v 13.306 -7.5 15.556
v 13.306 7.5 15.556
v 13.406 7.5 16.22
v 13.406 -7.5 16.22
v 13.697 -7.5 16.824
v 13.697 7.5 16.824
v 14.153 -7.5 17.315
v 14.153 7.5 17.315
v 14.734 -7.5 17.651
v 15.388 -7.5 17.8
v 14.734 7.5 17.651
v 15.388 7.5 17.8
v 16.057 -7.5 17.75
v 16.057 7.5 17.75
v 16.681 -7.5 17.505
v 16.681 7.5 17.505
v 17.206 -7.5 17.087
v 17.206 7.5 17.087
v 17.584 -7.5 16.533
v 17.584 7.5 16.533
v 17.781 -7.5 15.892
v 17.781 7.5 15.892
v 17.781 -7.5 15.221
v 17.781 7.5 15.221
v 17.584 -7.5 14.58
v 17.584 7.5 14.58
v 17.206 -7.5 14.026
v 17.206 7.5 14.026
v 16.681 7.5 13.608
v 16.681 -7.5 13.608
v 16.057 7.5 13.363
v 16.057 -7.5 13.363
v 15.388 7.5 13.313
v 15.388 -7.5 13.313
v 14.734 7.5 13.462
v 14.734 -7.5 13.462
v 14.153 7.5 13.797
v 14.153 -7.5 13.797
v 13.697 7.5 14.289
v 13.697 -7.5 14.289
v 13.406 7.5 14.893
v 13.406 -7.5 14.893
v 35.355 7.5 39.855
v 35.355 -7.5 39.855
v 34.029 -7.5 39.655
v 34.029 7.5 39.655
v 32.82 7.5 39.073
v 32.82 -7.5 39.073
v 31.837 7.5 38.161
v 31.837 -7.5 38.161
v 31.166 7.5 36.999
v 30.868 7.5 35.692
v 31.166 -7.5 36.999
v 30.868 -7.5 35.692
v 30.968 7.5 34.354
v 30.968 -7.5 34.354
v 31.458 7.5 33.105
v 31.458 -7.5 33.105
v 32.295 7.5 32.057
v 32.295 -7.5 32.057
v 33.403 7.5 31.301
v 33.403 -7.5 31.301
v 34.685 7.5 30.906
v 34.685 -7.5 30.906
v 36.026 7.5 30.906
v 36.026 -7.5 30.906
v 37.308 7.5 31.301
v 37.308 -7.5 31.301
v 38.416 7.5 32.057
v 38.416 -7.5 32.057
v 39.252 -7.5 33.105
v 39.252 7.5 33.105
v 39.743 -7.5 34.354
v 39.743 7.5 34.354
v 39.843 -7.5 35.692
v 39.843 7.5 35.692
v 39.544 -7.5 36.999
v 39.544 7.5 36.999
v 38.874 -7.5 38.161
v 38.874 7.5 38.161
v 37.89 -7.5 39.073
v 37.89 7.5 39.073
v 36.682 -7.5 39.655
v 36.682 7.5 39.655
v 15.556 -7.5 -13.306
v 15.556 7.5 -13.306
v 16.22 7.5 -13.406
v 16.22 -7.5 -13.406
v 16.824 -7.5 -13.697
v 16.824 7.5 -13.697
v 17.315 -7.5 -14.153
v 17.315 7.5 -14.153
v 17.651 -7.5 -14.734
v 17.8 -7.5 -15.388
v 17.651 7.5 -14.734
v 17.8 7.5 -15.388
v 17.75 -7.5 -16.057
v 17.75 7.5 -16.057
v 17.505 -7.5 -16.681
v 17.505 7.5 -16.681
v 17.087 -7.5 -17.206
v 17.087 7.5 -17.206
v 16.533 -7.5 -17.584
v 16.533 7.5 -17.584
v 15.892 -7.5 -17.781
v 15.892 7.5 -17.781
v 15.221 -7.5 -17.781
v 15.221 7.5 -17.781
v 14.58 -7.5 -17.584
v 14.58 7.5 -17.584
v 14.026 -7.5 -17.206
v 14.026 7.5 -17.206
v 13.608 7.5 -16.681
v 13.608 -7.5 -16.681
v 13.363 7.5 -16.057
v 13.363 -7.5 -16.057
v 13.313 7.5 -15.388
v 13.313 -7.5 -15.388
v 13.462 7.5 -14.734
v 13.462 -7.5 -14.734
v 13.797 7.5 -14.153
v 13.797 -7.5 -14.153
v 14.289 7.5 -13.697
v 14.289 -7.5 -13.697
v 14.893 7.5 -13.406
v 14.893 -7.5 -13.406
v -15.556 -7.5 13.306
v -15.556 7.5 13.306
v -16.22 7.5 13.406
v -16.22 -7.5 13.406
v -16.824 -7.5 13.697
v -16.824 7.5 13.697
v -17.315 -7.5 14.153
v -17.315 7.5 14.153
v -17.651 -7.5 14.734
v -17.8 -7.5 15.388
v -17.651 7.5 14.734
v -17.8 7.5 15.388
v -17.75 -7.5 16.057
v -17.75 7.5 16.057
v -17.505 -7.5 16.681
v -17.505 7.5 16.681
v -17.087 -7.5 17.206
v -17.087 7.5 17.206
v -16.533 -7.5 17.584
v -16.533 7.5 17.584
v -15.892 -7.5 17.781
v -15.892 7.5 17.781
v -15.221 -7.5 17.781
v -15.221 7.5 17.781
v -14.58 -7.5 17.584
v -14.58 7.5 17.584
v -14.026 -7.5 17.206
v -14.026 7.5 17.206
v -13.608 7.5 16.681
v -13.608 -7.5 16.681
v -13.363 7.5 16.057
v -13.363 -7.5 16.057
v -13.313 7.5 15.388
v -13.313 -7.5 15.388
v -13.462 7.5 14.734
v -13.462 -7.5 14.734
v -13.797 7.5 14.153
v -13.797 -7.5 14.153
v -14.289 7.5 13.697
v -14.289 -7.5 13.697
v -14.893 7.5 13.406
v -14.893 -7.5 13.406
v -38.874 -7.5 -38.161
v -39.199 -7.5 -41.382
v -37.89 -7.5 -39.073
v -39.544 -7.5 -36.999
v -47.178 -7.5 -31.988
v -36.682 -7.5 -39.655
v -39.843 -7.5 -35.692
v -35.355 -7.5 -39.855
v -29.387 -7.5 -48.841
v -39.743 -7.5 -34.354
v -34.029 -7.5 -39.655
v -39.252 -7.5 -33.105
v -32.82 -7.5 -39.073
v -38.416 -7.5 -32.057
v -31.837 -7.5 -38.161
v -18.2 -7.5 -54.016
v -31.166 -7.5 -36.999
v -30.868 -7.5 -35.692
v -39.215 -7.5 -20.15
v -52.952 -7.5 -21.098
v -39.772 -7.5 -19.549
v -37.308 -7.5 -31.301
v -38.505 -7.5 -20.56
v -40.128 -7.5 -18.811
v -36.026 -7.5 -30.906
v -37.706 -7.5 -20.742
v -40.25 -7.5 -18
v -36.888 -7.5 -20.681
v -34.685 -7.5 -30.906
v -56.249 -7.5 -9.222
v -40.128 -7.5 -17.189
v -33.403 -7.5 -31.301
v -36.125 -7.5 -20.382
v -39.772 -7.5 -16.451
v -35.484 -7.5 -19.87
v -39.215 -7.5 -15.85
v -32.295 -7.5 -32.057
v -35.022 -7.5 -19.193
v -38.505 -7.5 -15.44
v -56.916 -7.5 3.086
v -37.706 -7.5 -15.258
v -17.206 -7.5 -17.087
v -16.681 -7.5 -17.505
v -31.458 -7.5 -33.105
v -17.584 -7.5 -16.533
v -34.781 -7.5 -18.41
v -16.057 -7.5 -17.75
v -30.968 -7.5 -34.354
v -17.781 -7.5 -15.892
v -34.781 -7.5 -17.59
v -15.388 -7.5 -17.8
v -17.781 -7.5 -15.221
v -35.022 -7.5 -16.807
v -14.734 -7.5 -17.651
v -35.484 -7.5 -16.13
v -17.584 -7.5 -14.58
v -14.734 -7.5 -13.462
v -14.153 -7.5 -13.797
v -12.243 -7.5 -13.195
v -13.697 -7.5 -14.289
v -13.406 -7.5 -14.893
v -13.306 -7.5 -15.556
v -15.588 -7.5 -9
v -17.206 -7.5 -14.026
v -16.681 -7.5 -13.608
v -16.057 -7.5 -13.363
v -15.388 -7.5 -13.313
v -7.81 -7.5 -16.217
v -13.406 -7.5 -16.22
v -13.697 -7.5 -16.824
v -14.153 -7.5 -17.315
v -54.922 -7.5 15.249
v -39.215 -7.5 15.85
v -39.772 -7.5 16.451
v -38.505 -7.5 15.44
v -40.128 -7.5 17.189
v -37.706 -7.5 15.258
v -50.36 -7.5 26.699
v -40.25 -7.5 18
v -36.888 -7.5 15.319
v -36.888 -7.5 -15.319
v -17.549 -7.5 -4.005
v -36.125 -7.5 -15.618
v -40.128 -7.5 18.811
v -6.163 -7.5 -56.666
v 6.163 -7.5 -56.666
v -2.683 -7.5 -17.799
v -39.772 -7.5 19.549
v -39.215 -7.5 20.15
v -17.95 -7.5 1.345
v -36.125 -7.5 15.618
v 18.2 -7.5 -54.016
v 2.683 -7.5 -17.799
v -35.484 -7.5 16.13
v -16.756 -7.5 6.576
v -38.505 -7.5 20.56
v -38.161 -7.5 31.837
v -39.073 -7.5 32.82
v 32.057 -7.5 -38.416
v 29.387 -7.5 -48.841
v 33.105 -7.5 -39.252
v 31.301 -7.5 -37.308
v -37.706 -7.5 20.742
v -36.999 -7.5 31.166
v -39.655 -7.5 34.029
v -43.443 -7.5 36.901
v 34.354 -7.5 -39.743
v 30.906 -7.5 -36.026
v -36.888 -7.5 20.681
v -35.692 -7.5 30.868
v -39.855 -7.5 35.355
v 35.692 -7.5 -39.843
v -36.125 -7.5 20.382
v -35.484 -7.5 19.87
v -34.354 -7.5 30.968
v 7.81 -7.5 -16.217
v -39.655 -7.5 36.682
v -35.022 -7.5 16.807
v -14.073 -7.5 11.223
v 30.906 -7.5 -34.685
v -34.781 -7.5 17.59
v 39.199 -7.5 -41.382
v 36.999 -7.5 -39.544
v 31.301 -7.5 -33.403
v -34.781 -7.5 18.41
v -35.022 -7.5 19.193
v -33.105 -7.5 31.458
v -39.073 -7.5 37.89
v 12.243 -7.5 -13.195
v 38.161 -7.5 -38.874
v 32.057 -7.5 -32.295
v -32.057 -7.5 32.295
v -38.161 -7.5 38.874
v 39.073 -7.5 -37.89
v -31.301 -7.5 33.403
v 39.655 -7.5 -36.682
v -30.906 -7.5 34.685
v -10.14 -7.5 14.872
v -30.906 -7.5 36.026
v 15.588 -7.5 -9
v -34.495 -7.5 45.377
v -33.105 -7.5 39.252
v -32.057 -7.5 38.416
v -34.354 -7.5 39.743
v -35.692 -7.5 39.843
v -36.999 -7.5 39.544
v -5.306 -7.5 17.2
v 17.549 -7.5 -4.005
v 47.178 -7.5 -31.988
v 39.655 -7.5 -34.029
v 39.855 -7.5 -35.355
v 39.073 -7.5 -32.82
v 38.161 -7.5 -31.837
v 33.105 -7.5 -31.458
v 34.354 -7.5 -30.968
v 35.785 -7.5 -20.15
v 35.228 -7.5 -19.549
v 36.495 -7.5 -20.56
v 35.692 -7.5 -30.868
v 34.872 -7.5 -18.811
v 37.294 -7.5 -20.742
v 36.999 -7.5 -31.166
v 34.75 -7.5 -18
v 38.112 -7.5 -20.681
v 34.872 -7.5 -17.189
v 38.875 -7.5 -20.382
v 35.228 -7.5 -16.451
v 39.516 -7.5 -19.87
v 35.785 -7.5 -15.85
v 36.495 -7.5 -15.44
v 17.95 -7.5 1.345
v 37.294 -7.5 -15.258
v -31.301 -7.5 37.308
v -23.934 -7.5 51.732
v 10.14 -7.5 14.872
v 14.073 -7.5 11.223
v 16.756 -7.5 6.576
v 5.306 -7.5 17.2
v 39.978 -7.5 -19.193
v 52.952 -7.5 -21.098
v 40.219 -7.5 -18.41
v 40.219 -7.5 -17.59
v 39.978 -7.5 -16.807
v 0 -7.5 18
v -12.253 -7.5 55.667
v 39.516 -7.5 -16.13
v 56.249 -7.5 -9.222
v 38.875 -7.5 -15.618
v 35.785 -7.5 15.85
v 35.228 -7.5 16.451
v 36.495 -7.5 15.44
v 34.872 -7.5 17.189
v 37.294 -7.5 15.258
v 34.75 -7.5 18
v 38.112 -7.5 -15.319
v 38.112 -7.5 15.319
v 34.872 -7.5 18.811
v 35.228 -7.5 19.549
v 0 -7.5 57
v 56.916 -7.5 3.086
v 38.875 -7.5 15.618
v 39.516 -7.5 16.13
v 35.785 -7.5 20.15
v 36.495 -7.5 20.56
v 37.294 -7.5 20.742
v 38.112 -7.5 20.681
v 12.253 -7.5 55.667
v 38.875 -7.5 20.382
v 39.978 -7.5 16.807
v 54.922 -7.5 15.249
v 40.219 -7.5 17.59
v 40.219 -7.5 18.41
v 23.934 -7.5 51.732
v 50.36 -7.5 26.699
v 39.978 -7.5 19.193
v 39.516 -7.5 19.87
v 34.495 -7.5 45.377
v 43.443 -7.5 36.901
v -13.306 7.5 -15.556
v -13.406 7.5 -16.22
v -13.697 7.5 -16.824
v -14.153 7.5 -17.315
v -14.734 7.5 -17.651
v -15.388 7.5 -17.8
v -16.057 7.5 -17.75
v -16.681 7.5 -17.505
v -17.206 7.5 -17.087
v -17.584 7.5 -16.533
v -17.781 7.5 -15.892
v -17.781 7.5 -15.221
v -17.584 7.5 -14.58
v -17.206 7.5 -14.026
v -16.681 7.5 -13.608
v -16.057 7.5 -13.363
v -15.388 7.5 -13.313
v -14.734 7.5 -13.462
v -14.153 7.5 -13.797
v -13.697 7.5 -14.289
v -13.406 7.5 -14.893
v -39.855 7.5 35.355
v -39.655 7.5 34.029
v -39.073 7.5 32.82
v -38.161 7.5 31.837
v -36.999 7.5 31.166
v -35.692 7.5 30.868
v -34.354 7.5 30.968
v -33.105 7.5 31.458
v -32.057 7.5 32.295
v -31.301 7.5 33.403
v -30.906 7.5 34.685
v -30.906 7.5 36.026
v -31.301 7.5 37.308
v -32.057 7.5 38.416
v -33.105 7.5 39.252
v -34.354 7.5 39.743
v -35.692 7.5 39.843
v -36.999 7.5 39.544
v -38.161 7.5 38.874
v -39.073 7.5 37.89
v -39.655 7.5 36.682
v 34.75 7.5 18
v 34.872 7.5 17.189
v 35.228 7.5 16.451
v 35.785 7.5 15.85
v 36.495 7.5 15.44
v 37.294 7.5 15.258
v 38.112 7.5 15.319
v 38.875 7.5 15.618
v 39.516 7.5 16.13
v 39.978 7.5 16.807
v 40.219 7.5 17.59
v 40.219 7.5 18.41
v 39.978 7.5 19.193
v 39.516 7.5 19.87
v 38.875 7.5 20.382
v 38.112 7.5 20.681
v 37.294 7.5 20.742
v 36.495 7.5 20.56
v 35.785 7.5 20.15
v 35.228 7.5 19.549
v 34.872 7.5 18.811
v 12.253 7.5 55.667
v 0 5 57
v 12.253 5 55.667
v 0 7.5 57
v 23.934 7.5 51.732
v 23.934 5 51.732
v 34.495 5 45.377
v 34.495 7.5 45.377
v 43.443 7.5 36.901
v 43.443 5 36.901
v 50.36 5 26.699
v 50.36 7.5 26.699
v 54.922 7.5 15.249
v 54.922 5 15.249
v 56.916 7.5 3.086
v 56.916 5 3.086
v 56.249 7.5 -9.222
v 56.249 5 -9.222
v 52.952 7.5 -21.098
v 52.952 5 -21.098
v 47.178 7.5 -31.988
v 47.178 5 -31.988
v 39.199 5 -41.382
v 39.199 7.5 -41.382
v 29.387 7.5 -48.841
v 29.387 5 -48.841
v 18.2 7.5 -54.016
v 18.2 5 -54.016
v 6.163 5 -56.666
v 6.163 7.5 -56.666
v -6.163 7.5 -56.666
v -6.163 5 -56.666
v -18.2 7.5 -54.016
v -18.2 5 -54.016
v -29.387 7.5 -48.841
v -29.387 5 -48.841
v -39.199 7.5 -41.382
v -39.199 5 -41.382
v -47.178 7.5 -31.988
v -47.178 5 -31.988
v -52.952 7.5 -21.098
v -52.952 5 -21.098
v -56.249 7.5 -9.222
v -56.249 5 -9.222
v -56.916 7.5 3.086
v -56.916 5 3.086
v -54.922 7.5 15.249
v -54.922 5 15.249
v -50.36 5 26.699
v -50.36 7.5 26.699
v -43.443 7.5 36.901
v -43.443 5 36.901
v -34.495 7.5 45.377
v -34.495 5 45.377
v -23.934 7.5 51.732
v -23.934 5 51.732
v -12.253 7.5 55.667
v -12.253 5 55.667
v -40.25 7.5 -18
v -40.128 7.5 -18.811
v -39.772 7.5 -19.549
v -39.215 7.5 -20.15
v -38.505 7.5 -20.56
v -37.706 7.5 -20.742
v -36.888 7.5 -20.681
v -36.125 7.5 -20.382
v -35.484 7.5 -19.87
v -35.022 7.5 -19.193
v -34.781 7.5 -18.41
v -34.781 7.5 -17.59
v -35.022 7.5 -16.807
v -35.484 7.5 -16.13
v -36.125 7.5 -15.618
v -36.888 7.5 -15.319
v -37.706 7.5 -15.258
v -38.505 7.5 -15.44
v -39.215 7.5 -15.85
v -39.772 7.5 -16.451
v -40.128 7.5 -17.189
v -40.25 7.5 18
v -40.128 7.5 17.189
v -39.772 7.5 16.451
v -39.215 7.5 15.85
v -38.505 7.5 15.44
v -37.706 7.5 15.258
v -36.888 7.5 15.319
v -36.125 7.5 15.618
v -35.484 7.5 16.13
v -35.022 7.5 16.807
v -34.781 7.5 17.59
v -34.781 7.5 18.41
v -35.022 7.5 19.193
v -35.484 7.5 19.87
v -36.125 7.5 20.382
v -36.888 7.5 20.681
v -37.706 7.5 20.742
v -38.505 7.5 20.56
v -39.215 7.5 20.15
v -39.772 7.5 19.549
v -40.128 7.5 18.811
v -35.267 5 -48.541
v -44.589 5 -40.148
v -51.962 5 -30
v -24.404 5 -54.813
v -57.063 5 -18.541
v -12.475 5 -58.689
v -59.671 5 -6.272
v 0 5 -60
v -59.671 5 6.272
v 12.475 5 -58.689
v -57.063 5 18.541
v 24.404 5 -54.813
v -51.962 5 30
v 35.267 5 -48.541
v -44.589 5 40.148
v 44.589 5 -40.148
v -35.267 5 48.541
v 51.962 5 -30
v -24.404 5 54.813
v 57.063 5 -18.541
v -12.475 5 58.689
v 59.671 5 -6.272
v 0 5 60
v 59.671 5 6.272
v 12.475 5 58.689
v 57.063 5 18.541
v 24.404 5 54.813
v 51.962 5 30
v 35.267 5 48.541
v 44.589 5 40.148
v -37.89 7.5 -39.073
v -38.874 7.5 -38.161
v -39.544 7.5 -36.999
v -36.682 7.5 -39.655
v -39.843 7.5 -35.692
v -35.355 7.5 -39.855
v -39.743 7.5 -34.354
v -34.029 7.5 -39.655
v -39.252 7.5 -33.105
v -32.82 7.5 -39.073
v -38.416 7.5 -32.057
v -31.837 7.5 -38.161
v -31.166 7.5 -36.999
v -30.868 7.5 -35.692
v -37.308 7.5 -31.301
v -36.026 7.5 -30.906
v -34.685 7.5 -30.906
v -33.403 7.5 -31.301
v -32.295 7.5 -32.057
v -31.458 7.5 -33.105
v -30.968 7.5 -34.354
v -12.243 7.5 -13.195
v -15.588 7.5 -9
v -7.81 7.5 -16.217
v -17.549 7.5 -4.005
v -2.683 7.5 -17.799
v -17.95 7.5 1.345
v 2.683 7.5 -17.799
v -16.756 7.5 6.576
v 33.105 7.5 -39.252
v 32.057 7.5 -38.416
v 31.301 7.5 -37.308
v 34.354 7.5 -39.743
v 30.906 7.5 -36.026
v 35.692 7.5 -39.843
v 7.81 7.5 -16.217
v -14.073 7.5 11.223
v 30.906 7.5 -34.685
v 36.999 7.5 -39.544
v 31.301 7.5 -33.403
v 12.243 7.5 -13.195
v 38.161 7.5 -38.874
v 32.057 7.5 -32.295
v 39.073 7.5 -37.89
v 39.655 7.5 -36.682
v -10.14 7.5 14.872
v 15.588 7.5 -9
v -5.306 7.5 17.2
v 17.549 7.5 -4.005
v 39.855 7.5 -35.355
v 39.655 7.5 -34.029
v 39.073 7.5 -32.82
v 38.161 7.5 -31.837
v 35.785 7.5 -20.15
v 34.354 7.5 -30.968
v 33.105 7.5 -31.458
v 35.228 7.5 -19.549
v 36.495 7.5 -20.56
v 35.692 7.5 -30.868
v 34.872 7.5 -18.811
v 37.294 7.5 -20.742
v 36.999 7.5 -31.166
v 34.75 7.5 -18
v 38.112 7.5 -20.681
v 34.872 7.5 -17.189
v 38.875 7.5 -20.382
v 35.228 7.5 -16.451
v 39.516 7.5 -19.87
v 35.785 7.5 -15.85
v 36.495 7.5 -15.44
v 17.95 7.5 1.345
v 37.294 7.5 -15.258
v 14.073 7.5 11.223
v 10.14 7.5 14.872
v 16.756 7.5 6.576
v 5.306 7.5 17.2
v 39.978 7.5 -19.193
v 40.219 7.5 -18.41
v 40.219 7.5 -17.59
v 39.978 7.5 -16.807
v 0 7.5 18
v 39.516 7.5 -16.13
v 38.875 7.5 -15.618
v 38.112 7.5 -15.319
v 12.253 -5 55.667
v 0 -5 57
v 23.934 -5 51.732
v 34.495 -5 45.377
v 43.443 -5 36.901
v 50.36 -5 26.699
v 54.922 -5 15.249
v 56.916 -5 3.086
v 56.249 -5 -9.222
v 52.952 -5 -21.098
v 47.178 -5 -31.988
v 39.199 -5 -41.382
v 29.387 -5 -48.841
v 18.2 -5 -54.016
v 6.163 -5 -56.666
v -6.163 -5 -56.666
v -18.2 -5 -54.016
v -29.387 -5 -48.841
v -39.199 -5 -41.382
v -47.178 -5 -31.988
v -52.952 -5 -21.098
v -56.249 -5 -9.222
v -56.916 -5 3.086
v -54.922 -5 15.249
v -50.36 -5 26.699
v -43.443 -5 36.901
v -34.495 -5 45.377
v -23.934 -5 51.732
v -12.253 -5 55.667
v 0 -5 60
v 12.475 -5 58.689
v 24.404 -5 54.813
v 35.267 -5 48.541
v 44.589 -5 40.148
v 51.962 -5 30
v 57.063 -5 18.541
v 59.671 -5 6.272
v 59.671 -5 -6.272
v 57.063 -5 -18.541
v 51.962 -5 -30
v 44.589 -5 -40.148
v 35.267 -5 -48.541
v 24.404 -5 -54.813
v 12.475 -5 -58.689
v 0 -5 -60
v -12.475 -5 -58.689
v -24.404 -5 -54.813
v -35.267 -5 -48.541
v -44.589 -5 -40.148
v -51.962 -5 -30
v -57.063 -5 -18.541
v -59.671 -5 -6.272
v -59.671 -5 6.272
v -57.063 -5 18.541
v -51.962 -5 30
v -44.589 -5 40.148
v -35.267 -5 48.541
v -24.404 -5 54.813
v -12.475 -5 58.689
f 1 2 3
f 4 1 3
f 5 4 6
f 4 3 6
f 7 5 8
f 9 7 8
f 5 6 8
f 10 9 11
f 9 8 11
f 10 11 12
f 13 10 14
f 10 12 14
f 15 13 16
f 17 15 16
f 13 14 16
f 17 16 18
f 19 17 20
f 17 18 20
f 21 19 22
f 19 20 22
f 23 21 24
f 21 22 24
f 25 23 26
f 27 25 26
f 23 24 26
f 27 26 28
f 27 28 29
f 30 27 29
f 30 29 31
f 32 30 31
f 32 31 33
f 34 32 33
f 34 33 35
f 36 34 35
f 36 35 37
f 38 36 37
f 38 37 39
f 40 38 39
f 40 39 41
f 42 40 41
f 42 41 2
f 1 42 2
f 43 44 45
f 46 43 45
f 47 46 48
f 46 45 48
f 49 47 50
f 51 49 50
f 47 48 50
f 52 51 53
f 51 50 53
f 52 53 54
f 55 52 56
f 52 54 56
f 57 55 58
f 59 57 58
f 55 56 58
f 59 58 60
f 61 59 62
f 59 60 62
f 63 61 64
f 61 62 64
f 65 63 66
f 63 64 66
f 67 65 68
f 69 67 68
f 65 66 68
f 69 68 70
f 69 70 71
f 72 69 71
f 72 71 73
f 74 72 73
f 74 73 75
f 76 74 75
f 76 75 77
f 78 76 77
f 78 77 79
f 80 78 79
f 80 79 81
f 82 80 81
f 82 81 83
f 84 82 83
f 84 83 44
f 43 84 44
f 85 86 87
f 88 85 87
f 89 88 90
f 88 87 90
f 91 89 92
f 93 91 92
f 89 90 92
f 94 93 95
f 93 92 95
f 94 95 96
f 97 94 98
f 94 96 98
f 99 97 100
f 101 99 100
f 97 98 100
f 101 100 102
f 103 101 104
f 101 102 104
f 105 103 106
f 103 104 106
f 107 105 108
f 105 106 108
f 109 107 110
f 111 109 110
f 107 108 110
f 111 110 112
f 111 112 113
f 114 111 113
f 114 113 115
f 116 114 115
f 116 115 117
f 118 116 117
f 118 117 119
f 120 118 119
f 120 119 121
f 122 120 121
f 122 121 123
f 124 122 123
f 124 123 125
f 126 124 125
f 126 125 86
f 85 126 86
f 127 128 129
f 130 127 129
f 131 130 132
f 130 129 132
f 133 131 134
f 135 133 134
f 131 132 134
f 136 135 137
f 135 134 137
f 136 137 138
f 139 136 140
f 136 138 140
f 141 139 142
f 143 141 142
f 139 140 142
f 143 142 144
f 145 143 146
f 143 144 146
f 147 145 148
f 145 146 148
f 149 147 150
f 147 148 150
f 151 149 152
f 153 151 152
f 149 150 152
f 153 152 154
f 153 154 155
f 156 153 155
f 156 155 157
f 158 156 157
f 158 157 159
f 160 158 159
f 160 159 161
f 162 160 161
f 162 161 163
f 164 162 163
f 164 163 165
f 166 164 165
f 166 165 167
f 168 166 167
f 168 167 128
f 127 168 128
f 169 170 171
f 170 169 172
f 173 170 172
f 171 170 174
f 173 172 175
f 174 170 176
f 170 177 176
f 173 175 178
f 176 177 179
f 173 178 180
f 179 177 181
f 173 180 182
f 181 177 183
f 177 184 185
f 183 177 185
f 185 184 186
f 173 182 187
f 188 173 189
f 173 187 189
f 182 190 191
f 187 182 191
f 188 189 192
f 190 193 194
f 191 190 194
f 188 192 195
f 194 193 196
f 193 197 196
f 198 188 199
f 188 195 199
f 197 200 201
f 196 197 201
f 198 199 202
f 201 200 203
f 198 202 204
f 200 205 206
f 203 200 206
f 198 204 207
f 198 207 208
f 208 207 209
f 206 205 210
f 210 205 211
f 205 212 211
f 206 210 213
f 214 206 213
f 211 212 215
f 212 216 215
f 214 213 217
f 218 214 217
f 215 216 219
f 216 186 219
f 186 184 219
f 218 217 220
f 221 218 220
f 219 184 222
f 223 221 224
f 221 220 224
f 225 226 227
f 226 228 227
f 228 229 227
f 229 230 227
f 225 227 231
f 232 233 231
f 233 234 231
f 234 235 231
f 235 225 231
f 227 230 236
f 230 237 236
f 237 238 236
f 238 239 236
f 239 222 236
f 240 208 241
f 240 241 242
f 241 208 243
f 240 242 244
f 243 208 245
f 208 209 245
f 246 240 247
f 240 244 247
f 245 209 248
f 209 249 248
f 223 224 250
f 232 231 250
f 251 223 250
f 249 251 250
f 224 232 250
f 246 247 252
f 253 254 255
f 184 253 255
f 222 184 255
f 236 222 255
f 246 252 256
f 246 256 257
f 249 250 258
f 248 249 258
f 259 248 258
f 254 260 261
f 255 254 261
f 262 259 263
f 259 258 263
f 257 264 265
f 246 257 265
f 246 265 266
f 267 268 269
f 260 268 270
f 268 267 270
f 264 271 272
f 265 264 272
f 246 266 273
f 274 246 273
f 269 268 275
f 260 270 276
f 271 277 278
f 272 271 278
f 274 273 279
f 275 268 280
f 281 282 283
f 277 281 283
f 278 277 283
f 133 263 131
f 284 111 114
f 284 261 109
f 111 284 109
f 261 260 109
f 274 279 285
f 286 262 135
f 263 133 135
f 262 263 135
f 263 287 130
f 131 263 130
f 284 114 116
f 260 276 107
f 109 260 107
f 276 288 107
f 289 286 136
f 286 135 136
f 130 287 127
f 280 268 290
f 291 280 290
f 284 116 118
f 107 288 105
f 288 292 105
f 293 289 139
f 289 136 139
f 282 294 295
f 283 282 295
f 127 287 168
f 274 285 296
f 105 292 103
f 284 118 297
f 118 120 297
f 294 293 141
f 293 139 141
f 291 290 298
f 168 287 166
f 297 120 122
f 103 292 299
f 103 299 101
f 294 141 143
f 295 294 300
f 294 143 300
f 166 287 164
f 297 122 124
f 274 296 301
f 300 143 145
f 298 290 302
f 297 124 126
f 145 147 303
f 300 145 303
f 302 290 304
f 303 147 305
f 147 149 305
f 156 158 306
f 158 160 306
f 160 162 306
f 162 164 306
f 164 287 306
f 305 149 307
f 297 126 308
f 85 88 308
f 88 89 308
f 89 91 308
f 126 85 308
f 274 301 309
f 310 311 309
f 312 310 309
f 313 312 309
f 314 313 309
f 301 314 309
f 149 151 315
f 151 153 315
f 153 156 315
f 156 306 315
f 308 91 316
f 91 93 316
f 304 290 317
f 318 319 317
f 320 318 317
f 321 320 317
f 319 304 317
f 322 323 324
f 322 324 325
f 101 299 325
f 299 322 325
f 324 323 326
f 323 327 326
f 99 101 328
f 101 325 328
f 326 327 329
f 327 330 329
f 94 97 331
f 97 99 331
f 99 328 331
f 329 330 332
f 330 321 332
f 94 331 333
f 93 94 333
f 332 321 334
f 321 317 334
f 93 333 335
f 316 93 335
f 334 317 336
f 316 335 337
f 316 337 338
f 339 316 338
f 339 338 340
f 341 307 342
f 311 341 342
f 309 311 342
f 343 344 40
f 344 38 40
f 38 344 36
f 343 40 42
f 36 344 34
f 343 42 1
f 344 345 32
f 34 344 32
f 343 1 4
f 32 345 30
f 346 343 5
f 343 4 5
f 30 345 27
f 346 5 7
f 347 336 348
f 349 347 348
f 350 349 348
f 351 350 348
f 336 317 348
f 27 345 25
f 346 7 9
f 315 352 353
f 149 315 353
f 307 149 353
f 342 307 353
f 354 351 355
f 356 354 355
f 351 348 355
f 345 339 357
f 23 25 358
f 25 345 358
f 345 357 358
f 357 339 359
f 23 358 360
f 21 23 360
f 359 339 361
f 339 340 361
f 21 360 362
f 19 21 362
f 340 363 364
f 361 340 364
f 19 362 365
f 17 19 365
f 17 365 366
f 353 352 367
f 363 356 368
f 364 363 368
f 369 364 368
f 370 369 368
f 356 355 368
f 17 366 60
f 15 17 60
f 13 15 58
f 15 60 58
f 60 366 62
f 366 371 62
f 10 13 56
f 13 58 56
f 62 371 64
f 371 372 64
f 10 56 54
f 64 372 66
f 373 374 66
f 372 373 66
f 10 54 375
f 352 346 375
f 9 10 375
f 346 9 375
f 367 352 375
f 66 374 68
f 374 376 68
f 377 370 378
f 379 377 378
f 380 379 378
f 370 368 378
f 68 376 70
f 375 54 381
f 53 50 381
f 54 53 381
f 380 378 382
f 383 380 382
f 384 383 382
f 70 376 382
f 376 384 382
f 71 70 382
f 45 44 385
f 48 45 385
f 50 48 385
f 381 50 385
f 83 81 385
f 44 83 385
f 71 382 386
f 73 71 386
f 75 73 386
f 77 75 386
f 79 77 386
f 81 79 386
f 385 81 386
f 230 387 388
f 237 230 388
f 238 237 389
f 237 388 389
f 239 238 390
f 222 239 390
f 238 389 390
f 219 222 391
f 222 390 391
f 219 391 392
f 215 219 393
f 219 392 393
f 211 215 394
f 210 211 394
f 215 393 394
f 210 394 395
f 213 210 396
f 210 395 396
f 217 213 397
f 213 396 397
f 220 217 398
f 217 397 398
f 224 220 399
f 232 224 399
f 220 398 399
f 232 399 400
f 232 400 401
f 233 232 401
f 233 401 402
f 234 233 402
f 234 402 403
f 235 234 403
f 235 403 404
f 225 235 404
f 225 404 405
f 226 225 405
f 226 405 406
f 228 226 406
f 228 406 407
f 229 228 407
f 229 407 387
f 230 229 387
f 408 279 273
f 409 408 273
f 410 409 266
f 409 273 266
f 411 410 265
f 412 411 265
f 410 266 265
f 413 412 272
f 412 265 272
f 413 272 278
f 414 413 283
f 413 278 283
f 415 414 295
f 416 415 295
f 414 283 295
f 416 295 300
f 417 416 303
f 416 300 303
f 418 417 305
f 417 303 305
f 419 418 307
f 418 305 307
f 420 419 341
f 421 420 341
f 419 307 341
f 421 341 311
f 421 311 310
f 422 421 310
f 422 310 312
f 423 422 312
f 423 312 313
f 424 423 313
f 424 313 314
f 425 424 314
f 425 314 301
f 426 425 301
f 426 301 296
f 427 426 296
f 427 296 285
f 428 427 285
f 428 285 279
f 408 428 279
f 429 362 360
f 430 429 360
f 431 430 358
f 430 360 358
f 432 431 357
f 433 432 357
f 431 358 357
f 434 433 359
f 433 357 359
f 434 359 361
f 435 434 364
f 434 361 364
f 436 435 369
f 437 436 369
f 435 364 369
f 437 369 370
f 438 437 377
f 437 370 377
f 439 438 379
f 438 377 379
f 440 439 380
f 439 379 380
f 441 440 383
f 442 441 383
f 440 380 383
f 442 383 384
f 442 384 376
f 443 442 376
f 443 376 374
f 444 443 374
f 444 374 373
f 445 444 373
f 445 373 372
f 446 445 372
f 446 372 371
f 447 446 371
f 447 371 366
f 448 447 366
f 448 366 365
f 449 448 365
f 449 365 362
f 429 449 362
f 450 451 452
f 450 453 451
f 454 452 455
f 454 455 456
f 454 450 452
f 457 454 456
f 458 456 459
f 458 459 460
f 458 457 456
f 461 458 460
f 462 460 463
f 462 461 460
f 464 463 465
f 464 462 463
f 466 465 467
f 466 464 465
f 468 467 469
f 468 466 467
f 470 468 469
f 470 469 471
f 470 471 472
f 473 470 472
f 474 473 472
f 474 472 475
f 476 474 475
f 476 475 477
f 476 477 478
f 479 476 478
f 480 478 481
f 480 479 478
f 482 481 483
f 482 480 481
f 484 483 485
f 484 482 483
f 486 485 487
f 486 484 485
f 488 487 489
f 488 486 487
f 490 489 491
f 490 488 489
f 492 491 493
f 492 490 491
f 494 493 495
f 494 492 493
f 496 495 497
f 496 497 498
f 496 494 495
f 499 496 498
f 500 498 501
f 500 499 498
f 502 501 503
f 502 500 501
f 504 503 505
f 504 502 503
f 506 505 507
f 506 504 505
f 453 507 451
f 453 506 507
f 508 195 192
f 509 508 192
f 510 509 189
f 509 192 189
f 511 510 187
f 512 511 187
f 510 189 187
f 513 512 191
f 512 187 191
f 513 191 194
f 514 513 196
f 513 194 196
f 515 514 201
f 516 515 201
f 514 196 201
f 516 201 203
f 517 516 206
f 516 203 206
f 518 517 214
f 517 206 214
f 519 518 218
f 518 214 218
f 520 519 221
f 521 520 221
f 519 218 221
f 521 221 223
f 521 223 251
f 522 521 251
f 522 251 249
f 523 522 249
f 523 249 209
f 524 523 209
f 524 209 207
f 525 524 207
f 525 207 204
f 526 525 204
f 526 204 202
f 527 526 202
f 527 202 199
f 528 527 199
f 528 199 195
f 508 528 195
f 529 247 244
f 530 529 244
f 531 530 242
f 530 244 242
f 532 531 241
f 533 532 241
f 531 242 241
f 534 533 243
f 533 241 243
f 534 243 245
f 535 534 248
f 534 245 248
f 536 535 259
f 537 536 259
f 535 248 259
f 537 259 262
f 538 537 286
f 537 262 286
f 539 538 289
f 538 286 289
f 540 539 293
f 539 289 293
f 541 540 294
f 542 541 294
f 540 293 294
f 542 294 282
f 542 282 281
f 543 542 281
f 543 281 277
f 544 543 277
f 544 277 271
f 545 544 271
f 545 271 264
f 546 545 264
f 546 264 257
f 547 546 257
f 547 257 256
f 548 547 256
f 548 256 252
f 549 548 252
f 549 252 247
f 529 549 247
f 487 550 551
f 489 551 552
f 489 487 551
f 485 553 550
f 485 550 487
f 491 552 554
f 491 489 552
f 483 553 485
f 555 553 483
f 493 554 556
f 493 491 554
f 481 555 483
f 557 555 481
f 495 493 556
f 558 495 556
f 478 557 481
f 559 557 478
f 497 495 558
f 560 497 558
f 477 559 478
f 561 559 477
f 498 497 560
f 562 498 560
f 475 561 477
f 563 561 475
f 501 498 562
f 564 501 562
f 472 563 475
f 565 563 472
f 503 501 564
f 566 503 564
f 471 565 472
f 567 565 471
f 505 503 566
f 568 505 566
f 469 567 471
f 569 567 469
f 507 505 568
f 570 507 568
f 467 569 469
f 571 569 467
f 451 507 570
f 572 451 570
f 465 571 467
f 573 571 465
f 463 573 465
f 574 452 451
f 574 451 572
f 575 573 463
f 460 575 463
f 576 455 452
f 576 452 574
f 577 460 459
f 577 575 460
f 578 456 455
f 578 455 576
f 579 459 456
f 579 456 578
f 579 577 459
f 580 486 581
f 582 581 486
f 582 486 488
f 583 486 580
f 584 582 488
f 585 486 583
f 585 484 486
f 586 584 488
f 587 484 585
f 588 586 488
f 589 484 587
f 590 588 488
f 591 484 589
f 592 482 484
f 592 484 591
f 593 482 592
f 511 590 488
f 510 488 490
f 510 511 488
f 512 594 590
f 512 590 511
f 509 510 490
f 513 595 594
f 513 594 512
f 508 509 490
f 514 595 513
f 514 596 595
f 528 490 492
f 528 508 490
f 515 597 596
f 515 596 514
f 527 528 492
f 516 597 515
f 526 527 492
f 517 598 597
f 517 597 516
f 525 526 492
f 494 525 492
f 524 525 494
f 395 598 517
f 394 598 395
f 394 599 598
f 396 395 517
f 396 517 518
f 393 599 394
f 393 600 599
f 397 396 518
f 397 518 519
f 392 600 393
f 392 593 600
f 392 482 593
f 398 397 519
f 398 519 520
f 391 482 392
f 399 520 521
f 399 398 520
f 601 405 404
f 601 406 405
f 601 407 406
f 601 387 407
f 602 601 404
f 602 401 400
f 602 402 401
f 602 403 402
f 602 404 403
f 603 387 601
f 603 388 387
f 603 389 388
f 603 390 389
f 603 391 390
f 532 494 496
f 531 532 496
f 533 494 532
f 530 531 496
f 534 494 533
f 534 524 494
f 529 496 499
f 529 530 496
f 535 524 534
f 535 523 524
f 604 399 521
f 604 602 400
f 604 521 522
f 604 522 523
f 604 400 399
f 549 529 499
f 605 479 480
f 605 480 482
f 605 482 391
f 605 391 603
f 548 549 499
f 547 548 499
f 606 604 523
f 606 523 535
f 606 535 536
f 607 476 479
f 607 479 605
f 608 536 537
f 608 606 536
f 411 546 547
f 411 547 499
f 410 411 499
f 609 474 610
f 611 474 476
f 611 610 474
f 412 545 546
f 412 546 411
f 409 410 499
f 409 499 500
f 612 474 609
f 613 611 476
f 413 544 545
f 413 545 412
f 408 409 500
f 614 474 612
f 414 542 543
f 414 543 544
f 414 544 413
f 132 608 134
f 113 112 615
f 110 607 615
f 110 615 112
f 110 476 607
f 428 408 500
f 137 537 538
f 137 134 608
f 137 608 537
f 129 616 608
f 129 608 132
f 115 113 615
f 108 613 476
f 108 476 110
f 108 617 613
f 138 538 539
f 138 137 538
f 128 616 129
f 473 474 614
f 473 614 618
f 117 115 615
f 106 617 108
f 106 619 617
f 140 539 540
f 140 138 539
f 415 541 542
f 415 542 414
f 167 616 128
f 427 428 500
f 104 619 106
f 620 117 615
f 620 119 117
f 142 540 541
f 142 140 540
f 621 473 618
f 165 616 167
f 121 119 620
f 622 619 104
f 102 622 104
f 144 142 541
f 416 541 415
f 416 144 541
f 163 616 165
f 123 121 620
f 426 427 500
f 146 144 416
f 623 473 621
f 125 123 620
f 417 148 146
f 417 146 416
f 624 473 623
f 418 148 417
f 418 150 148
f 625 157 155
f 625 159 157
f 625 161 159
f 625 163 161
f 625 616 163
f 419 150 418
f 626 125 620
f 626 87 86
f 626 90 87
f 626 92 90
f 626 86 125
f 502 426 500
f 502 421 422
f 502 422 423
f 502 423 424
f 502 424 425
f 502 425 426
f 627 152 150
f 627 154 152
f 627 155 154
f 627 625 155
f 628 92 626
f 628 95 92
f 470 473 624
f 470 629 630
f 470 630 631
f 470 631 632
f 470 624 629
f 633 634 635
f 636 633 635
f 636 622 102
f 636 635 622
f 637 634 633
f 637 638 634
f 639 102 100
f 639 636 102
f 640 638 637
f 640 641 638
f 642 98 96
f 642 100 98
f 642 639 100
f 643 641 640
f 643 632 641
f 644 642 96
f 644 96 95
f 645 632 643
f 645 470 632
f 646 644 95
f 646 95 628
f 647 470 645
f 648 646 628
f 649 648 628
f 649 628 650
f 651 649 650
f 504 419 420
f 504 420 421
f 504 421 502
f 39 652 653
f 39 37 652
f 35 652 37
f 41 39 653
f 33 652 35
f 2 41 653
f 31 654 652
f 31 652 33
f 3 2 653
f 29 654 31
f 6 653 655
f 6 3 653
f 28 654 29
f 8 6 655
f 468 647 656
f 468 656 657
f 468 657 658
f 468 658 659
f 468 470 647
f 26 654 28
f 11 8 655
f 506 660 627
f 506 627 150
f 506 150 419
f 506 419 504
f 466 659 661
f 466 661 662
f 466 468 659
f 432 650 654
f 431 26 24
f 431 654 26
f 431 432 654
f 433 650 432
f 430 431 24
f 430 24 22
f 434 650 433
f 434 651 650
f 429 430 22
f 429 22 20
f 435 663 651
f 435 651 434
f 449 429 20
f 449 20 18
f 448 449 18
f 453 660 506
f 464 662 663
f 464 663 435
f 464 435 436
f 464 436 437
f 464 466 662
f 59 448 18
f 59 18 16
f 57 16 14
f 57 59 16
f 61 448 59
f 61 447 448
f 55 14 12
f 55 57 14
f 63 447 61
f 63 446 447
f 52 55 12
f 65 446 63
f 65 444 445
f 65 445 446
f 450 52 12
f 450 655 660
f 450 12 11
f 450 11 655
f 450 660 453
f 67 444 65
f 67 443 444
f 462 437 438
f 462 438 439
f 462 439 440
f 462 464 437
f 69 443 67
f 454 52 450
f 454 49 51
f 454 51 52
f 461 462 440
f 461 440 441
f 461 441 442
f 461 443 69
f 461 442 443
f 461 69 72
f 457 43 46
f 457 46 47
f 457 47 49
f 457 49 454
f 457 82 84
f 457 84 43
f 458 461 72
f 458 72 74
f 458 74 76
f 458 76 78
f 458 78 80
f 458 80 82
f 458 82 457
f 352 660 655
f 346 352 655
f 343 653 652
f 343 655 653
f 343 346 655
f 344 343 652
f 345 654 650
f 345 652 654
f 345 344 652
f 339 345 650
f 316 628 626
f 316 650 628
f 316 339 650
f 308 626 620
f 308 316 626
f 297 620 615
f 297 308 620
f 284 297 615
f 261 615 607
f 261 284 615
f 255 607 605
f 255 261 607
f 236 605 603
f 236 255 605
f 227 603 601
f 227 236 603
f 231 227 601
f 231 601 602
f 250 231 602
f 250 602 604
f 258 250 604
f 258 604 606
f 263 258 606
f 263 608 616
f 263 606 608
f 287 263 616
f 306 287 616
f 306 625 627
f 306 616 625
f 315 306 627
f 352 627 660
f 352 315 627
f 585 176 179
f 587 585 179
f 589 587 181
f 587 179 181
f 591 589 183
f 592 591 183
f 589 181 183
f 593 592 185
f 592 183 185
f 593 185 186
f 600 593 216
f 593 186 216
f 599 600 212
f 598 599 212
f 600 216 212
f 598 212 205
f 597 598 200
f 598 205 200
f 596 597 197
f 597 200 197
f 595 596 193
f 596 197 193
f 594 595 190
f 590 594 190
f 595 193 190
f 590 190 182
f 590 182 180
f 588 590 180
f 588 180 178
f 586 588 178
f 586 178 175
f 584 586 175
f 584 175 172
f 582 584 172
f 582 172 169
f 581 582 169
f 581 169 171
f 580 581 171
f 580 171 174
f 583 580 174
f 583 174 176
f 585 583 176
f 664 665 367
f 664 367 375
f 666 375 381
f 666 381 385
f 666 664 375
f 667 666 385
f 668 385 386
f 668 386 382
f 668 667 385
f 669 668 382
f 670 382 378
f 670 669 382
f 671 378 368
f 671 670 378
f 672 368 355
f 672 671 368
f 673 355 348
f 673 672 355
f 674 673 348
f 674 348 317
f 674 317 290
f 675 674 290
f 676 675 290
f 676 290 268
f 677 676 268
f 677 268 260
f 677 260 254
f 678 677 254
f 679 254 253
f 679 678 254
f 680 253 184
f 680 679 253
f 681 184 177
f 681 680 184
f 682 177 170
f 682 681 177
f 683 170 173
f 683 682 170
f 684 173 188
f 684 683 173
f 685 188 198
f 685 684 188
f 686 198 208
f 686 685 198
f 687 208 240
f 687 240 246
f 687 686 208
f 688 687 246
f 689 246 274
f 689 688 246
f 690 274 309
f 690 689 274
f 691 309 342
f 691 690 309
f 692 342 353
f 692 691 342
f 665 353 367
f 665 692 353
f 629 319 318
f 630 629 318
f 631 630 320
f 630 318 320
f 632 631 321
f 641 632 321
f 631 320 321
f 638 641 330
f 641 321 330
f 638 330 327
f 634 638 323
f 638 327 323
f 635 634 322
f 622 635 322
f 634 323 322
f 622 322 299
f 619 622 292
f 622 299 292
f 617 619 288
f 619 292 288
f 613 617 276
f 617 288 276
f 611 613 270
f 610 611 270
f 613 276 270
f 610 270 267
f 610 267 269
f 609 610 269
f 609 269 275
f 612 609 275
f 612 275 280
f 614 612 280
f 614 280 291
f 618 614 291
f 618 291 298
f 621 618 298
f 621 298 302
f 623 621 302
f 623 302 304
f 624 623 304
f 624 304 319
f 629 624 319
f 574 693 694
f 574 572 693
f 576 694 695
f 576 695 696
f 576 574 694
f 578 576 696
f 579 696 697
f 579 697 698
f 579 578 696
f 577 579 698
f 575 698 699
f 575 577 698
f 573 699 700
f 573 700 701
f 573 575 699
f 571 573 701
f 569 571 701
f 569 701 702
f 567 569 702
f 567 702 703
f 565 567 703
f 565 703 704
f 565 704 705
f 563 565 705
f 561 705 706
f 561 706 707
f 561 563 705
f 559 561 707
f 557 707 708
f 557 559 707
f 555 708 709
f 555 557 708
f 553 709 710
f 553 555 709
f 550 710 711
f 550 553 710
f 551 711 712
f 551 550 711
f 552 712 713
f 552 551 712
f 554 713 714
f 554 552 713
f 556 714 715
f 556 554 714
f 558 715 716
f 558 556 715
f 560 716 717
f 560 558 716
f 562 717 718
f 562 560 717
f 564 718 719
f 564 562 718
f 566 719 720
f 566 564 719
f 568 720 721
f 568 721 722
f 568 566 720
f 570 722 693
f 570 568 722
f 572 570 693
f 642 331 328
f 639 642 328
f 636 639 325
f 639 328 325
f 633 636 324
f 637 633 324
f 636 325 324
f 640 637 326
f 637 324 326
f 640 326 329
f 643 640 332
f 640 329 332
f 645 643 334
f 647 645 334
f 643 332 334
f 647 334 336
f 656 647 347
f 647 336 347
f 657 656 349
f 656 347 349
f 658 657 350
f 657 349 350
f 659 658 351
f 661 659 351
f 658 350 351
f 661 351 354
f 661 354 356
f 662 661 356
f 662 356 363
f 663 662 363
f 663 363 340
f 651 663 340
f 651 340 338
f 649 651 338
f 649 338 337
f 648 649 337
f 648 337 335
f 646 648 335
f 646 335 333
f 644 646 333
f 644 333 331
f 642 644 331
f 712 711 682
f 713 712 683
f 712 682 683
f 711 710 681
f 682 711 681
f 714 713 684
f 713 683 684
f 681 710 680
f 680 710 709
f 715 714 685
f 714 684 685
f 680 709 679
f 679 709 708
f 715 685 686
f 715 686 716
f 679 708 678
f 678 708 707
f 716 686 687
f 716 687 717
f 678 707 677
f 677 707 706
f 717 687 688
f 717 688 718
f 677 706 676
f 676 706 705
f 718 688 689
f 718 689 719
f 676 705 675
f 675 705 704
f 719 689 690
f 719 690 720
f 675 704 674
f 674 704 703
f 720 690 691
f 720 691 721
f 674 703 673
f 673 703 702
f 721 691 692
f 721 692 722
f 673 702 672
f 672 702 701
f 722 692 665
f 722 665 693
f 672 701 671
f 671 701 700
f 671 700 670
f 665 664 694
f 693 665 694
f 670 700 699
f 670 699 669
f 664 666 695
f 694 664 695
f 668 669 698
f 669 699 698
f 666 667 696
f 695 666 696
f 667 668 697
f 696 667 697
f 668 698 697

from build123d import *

# Parameters (mm, degrees)
SKETCH1_R                  = 57
EXTRUDE4_DEPTH             = 7.5
SKETCH_R                   = 60
SKETCH_R_2                 = 57
EXTRUDE5_DEPTH             = 5
EXTRUDE6_DEPTH             = 86.183625187
EXTRUDE6_DEPTH_BACK        = 86.183625187
SKETCH5_R                  = 18
F_4_5_4_5_DIAMETER_HOLE1_D = 4.5
CIRPATTERN1_COUNT          = 4
M5_CLEARANCE_HOLE1_D       = 5.5
M8_CLEARANCE_HOLE2_D       = 9
CIRPATTERN3_COUNT          = 4


with BuildPart() as part:
    # Sketch1 → Extrude4 (new, symmetric)
    with BuildSketch(Plane(origin=(0, 0, 0), x_dir=(1, 0, 0), z_dir=(0, 1, 0))):
        Circle(SKETCH1_R)
    extrude(amount=EXTRUDE4_DEPTH, both=True)

    # Sketch → Extrude5 (add, symmetric)
    with BuildSketch(Plane(origin=(0, 0, 0), x_dir=(1, 0, 0), z_dir=(0, 1, 0))):
        Circle(SKETCH_R)
        Circle(SKETCH_R_2, mode=Mode.SUBTRACT)
    extrude(amount=EXTRUDE5_DEPTH, both=True)

    # Sketch5 → Extrude6 (cut, two sides: drawn at the far end of the back side and taken through both)
    with BuildSketch(Plane(origin=(0, 0, 0), x_dir=(1, 0, 0), z_dir=(0, 1, 0)).offset(-EXTRUDE6_DEPTH_BACK)):
        Circle(SKETCH5_R)
    extrude(amount=EXTRUDE6_DEPTH + EXTRUDE6_DEPTH_BACK, mode=Mode.SUBTRACT)

    # Ø4.5 (4.5) Diameter Hole1 (through all)
    with Locations(Plane(origin=(0, -7.5, 0), x_dir=(-1, 0, 0), z_dir=(0, -1, 0))):
        with Locations((15.556349186, 15.556349186)):
            f_4_5_4_5_diameter_hole1 = Hole(F_4_5_4_5_DIAMETER_HOLE1_D / 2)

    # CirPattern1: Ø4.5 (4.5) Diameter Hole1 ×4 about axis
    cirpattern1_axis = Axis((0, -8.25, 0), (0, 1, 0))
    for i in range(1, CIRPATTERN1_COUNT):
        add(f_4_5_4_5_diameter_hole1.rotate(cirpattern1_axis, i * 360 / CIRPATTERN1_COUNT), mode=Mode.SUBTRACT)

    # M5 Clearance Hole1 (through all)
    with Locations(Plane(origin=(0, 7.5, 0), x_dir=(1, 0, 0), z_dir=(0, 1, 0))):
        with Locations((-37.5, 18), (-37.5, -18), (37.5, -18), (37.5, 18)):
            Hole(M5_CLEARANCE_HOLE1_D / 2)

    # M8 Clearance Hole2 (through all)
    with Locations(Plane(origin=(0, 7.5, 0), x_dir=(1, 0, 0), z_dir=(0, 1, 0))):
        with Locations((-35.355339059, -35.355339059)):
            m8_clearance_hole2 = Hole(M8_CLEARANCE_HOLE2_D / 2)

    # CirPattern3: M8 Clearance Hole2 ×4 about axis
    cirpattern3_axis = Axis((0, -8.25, 0), (0, 1, 0))
    for i in range(1, CIRPATTERN3_COUNT):
        add(m8_clearance_hole2.rotate(cirpattern3_axis, i * 360 / CIRPATTERN3_COUNT), mode=Mode.SUBTRACT)


solid = part.part
